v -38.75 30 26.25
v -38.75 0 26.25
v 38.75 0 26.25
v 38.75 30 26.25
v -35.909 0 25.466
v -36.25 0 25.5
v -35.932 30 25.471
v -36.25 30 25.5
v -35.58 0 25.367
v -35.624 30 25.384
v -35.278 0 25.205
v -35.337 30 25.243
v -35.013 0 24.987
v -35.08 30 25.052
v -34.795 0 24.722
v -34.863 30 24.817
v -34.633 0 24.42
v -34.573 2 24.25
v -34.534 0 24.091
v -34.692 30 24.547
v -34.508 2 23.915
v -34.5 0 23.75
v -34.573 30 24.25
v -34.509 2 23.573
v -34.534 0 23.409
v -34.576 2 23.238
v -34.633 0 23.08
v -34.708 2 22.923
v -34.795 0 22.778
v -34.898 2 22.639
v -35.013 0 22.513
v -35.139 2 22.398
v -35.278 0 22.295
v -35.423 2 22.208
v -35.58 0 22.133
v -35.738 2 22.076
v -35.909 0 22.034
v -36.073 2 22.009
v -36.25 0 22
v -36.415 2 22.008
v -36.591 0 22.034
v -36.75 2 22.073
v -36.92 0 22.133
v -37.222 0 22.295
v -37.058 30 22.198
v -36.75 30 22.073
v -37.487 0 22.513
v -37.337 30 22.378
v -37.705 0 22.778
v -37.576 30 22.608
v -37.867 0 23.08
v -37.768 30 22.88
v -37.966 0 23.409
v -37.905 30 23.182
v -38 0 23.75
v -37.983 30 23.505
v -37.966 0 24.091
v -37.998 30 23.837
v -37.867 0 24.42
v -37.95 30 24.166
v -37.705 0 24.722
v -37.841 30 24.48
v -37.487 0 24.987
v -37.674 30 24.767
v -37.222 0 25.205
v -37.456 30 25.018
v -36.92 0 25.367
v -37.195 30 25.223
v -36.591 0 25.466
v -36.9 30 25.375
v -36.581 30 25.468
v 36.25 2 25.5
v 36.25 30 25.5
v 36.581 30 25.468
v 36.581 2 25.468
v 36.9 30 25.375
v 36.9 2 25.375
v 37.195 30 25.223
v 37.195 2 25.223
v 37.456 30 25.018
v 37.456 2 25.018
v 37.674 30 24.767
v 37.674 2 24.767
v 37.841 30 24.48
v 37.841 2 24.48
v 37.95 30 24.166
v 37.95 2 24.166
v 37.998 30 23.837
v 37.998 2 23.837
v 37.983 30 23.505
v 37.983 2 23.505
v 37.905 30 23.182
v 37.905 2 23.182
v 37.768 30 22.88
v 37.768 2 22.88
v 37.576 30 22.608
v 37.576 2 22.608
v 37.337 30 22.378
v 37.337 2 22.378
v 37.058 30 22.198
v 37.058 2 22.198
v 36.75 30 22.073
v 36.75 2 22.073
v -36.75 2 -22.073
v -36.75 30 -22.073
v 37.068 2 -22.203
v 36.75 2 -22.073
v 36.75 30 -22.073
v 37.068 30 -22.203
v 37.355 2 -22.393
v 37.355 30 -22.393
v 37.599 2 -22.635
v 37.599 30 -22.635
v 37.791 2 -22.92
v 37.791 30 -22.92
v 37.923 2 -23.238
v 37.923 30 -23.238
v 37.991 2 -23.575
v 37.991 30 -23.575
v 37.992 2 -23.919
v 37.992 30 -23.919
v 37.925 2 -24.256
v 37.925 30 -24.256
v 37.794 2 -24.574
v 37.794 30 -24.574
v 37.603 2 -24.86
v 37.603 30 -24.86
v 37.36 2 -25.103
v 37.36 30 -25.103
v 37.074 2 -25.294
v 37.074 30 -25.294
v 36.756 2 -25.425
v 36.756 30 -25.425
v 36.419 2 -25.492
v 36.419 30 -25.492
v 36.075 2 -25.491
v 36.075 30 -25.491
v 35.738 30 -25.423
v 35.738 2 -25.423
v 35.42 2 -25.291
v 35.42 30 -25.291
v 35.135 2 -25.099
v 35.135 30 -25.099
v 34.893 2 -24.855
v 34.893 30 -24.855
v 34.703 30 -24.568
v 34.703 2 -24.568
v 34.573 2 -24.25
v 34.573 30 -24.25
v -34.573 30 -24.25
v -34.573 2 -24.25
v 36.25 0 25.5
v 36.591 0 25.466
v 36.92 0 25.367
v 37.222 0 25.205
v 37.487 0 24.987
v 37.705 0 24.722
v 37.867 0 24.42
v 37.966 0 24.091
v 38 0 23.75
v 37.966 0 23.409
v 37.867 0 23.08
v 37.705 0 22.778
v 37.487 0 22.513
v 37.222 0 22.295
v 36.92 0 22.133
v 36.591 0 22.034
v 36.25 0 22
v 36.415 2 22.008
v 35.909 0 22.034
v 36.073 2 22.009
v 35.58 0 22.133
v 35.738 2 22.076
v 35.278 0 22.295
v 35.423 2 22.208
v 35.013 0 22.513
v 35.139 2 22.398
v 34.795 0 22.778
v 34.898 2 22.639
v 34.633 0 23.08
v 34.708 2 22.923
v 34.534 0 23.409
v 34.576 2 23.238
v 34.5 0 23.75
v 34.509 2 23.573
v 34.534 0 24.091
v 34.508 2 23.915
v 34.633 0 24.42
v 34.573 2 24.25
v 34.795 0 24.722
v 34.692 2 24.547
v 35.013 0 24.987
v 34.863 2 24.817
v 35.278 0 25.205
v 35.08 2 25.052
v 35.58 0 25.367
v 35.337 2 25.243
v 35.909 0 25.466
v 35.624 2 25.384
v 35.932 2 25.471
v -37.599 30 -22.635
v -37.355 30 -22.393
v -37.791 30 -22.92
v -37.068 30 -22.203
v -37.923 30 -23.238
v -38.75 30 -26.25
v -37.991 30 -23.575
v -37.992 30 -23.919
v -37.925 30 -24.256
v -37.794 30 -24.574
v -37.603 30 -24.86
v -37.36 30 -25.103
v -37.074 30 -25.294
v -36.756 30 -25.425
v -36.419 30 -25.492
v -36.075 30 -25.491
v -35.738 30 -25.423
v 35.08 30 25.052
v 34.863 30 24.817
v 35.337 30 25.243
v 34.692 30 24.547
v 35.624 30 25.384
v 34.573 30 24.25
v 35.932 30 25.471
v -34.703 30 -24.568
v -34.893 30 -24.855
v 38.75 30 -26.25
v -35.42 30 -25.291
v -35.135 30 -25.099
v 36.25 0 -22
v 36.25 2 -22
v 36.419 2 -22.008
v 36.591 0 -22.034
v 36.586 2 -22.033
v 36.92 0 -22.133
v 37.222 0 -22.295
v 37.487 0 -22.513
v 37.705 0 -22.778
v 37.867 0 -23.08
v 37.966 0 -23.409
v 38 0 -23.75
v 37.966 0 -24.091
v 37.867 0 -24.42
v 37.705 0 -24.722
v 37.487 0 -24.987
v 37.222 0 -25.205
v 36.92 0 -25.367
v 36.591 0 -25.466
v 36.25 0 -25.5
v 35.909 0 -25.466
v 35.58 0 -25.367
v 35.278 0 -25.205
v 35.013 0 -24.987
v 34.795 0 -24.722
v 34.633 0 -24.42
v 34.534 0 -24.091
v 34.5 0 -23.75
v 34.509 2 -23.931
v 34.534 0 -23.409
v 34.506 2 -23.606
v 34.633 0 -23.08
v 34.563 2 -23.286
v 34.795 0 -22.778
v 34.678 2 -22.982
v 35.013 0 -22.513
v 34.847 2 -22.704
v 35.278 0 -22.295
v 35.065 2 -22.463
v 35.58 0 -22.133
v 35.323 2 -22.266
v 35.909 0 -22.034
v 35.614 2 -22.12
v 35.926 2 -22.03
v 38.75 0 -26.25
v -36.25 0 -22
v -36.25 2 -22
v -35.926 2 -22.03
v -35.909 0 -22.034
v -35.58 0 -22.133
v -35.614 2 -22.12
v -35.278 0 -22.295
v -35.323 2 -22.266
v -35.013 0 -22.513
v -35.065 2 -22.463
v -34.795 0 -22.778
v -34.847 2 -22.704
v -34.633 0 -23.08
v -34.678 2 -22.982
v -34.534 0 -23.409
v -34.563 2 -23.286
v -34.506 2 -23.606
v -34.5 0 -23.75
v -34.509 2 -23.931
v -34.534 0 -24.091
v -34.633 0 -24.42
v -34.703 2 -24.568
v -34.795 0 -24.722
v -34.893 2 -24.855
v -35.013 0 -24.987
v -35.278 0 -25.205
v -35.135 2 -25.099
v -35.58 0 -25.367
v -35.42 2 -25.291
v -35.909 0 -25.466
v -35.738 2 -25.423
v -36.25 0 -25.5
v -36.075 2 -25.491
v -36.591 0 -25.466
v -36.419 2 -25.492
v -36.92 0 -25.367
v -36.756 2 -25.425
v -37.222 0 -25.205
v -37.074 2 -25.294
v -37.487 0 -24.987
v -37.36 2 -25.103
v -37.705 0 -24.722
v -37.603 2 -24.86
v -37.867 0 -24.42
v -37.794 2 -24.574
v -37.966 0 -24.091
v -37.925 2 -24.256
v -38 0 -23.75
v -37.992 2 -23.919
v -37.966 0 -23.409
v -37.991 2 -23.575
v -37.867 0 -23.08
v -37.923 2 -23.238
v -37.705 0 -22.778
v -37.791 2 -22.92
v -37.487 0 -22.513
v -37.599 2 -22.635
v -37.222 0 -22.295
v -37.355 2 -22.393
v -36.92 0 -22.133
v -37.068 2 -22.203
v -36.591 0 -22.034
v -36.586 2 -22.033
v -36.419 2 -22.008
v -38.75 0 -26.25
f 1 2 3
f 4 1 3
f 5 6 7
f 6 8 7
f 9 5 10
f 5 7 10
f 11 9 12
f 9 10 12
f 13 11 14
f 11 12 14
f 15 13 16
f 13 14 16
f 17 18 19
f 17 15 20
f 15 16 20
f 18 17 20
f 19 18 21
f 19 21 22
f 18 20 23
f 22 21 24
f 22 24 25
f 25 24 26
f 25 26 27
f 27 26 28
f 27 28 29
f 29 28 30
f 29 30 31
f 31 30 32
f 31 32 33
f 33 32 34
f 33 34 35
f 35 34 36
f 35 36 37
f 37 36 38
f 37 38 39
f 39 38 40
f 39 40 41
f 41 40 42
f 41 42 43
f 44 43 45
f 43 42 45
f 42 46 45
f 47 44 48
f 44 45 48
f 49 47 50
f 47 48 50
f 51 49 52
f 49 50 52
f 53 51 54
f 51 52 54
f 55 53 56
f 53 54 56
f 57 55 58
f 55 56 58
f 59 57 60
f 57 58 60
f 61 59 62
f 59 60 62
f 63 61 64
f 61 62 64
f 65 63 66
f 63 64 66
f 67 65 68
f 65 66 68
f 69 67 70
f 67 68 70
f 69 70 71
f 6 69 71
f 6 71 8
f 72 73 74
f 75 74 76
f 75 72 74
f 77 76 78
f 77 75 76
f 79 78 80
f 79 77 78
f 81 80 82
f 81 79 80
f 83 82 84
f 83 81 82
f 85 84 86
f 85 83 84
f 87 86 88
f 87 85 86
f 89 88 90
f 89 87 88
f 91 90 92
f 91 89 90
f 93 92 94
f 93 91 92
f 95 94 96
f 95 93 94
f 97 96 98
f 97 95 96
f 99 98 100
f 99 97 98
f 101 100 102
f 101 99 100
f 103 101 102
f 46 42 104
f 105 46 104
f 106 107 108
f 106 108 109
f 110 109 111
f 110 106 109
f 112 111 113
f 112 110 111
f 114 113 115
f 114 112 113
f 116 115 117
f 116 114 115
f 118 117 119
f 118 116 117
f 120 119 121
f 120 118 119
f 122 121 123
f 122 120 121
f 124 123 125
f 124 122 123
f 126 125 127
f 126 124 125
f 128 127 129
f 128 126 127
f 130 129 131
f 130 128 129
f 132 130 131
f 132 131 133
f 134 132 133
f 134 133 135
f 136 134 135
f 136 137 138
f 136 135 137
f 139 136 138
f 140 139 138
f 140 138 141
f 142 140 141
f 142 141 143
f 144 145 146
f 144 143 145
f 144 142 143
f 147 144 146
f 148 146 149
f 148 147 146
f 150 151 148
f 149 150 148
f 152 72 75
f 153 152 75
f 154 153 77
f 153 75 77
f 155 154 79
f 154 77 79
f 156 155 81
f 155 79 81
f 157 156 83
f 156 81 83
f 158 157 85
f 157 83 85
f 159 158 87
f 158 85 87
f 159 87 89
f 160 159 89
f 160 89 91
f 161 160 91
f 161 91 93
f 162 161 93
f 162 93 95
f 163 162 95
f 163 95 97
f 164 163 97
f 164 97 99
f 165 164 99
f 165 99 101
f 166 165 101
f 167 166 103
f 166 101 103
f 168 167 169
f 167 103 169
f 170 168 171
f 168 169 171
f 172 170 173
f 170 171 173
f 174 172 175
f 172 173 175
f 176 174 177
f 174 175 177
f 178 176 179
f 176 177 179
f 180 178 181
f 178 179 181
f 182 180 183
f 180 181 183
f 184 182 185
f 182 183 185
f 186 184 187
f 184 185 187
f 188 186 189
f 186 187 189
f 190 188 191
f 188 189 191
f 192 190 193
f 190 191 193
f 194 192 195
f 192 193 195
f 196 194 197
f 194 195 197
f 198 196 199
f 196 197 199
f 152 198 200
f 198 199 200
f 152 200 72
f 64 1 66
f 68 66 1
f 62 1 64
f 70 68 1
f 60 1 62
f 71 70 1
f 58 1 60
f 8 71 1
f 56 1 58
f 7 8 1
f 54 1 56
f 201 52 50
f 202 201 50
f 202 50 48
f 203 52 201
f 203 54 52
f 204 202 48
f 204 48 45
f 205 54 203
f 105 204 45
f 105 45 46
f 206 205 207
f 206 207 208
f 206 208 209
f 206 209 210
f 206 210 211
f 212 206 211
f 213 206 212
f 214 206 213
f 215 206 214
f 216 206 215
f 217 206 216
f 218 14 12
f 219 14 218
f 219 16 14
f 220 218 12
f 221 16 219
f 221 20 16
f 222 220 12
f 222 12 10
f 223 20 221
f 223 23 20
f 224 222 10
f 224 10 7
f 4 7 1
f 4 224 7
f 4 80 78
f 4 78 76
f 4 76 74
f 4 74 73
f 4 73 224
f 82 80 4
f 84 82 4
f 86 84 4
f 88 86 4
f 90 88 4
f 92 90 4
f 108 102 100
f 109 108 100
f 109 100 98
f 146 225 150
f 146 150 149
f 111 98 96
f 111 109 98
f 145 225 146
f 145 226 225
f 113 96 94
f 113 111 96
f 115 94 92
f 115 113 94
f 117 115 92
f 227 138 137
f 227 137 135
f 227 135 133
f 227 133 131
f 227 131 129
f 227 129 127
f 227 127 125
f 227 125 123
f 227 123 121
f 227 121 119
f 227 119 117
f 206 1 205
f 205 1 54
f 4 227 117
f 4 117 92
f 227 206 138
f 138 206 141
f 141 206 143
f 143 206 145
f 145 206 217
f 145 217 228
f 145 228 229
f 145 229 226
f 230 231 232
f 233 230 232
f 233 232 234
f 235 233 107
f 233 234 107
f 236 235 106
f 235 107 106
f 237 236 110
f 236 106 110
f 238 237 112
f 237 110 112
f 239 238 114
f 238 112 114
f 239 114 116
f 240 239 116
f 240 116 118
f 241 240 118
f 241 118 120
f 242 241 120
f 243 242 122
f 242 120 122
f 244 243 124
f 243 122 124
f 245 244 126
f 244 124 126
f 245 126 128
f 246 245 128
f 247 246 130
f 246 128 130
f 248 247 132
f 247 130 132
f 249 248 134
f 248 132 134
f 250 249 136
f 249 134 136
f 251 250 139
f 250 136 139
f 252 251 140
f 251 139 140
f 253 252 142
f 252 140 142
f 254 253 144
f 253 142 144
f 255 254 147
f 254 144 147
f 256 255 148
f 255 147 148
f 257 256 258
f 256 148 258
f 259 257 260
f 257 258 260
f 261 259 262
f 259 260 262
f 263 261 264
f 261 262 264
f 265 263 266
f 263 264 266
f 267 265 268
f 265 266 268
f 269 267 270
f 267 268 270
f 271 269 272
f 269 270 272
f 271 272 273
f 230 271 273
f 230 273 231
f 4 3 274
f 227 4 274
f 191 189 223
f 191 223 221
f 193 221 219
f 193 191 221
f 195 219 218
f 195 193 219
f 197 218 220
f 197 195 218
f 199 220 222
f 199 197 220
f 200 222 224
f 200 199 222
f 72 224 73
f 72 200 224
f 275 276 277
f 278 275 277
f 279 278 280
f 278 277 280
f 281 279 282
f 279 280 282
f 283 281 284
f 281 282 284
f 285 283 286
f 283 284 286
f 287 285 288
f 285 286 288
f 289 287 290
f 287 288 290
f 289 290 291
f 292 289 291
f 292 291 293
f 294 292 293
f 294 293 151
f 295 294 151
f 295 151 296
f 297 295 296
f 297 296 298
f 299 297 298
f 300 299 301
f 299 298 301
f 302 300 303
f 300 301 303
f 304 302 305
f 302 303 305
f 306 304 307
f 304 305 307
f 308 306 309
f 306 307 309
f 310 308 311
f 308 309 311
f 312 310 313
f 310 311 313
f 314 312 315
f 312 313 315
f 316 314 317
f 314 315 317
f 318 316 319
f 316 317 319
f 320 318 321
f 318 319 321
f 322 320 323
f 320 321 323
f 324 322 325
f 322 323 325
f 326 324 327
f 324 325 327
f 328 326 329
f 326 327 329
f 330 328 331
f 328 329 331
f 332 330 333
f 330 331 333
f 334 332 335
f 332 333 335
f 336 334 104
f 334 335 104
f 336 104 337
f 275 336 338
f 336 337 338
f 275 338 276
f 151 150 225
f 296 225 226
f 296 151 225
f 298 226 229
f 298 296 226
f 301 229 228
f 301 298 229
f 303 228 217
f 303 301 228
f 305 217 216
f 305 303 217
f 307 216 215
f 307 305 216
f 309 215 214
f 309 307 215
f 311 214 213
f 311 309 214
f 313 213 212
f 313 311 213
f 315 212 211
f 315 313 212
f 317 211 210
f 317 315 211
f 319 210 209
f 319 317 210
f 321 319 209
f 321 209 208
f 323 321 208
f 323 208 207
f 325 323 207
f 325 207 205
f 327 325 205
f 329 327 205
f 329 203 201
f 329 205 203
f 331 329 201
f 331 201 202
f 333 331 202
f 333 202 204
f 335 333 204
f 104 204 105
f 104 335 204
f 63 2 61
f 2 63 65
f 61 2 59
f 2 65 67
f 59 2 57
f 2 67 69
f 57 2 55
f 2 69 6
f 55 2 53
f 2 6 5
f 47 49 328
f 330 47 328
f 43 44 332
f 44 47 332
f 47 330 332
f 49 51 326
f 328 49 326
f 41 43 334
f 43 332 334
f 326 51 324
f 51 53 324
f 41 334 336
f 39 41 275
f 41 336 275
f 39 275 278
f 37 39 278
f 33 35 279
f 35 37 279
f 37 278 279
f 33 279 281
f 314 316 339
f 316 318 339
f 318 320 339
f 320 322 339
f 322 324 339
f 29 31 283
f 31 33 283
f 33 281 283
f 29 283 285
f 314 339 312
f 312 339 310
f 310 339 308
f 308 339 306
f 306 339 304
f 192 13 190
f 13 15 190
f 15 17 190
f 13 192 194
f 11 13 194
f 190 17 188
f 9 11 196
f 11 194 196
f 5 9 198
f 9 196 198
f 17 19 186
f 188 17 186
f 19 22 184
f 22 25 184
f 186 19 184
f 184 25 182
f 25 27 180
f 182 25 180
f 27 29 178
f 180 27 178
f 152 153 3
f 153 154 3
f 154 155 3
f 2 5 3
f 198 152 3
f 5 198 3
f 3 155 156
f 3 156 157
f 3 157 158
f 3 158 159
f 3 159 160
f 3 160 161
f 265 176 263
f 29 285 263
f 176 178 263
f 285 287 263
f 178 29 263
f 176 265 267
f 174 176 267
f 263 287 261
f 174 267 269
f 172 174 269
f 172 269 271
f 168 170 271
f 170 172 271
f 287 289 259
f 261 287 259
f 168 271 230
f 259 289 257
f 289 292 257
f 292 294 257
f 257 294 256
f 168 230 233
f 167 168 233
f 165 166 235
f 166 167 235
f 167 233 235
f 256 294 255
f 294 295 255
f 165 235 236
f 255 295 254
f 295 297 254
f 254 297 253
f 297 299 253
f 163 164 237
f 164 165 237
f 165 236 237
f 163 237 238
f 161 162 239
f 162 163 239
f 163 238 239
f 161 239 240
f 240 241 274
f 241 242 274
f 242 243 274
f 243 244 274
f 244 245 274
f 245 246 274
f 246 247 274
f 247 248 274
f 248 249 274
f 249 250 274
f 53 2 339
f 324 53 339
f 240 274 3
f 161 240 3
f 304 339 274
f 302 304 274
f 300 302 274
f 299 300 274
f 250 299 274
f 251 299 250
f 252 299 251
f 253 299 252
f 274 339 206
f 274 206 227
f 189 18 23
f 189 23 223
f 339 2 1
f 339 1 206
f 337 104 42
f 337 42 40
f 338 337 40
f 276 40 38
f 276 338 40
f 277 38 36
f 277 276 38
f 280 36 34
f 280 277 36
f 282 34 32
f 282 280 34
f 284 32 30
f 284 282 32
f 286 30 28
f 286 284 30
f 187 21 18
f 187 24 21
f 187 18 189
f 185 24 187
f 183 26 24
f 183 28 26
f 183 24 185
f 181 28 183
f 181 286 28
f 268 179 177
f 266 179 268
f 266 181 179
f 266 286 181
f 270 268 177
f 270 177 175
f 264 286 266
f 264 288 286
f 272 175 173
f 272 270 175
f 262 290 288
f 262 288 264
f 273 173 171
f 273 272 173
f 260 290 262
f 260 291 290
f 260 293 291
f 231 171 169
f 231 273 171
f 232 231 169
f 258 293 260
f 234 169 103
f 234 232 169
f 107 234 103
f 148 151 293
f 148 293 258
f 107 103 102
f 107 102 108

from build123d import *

# Parameters (mm, degrees)
CROQUIS1_W              = 77.5
CROQUIS1_H              = 52.5
SALIENTE_EXTRUIR1_DEPTH = 30
VACIADO1_T              = -2
CROQUIS2_R              = 1.75
CORTAR_EXTRUIR1_DEPTH   = 30


with BuildPart() as part:
    # Croquis1 → Saliente-Extruir1 (new body)
    with BuildSketch(Plane(origin=(0, 0, 0), x_dir=(1, 0, 0), z_dir=(0, 1, 0))):
        Rectangle(CROQUIS1_W, CROQUIS1_H)
    extrude(amount=SALIENTE_EXTRUIR1_DEPTH)

    # Vaciado1
    vaciado1_openings = [part.faces().sort_by_distance(p)[0] for p in [
        (0, 30, 0),
    ]]
    offset(amount=VACIADO1_T, openings=vaciado1_openings, kind=Kind.INTERSECTION)

    # Croquis2 → Cortar-Extruir1 (cut, symmetric)
    with BuildSketch(Plane(origin=(0, 2, 0), x_dir=(1, 0, 0), z_dir=(0, 1, 0))):
        with Locations(Location((-36.25, 23.75, 0), (0, 0, 270))):
            Circle(CROQUIS2_R)
        with Locations(Location((36.25, 23.75, 0), (0, 0, 270))):
            Circle(CROQUIS2_R)
        with Locations(Location((36.25, -23.75, 0), (0, 0, 270))):
            Circle(CROQUIS2_R)
        with Locations(Location((-36.25, -23.75, 0), (0, 0, 270))):
            Circle(CROQUIS2_R)
    extrude(amount=CORTAR_EXTRUIR1_DEPTH, both=True, mode=Mode.SUBTRACT)


solid = part.part
